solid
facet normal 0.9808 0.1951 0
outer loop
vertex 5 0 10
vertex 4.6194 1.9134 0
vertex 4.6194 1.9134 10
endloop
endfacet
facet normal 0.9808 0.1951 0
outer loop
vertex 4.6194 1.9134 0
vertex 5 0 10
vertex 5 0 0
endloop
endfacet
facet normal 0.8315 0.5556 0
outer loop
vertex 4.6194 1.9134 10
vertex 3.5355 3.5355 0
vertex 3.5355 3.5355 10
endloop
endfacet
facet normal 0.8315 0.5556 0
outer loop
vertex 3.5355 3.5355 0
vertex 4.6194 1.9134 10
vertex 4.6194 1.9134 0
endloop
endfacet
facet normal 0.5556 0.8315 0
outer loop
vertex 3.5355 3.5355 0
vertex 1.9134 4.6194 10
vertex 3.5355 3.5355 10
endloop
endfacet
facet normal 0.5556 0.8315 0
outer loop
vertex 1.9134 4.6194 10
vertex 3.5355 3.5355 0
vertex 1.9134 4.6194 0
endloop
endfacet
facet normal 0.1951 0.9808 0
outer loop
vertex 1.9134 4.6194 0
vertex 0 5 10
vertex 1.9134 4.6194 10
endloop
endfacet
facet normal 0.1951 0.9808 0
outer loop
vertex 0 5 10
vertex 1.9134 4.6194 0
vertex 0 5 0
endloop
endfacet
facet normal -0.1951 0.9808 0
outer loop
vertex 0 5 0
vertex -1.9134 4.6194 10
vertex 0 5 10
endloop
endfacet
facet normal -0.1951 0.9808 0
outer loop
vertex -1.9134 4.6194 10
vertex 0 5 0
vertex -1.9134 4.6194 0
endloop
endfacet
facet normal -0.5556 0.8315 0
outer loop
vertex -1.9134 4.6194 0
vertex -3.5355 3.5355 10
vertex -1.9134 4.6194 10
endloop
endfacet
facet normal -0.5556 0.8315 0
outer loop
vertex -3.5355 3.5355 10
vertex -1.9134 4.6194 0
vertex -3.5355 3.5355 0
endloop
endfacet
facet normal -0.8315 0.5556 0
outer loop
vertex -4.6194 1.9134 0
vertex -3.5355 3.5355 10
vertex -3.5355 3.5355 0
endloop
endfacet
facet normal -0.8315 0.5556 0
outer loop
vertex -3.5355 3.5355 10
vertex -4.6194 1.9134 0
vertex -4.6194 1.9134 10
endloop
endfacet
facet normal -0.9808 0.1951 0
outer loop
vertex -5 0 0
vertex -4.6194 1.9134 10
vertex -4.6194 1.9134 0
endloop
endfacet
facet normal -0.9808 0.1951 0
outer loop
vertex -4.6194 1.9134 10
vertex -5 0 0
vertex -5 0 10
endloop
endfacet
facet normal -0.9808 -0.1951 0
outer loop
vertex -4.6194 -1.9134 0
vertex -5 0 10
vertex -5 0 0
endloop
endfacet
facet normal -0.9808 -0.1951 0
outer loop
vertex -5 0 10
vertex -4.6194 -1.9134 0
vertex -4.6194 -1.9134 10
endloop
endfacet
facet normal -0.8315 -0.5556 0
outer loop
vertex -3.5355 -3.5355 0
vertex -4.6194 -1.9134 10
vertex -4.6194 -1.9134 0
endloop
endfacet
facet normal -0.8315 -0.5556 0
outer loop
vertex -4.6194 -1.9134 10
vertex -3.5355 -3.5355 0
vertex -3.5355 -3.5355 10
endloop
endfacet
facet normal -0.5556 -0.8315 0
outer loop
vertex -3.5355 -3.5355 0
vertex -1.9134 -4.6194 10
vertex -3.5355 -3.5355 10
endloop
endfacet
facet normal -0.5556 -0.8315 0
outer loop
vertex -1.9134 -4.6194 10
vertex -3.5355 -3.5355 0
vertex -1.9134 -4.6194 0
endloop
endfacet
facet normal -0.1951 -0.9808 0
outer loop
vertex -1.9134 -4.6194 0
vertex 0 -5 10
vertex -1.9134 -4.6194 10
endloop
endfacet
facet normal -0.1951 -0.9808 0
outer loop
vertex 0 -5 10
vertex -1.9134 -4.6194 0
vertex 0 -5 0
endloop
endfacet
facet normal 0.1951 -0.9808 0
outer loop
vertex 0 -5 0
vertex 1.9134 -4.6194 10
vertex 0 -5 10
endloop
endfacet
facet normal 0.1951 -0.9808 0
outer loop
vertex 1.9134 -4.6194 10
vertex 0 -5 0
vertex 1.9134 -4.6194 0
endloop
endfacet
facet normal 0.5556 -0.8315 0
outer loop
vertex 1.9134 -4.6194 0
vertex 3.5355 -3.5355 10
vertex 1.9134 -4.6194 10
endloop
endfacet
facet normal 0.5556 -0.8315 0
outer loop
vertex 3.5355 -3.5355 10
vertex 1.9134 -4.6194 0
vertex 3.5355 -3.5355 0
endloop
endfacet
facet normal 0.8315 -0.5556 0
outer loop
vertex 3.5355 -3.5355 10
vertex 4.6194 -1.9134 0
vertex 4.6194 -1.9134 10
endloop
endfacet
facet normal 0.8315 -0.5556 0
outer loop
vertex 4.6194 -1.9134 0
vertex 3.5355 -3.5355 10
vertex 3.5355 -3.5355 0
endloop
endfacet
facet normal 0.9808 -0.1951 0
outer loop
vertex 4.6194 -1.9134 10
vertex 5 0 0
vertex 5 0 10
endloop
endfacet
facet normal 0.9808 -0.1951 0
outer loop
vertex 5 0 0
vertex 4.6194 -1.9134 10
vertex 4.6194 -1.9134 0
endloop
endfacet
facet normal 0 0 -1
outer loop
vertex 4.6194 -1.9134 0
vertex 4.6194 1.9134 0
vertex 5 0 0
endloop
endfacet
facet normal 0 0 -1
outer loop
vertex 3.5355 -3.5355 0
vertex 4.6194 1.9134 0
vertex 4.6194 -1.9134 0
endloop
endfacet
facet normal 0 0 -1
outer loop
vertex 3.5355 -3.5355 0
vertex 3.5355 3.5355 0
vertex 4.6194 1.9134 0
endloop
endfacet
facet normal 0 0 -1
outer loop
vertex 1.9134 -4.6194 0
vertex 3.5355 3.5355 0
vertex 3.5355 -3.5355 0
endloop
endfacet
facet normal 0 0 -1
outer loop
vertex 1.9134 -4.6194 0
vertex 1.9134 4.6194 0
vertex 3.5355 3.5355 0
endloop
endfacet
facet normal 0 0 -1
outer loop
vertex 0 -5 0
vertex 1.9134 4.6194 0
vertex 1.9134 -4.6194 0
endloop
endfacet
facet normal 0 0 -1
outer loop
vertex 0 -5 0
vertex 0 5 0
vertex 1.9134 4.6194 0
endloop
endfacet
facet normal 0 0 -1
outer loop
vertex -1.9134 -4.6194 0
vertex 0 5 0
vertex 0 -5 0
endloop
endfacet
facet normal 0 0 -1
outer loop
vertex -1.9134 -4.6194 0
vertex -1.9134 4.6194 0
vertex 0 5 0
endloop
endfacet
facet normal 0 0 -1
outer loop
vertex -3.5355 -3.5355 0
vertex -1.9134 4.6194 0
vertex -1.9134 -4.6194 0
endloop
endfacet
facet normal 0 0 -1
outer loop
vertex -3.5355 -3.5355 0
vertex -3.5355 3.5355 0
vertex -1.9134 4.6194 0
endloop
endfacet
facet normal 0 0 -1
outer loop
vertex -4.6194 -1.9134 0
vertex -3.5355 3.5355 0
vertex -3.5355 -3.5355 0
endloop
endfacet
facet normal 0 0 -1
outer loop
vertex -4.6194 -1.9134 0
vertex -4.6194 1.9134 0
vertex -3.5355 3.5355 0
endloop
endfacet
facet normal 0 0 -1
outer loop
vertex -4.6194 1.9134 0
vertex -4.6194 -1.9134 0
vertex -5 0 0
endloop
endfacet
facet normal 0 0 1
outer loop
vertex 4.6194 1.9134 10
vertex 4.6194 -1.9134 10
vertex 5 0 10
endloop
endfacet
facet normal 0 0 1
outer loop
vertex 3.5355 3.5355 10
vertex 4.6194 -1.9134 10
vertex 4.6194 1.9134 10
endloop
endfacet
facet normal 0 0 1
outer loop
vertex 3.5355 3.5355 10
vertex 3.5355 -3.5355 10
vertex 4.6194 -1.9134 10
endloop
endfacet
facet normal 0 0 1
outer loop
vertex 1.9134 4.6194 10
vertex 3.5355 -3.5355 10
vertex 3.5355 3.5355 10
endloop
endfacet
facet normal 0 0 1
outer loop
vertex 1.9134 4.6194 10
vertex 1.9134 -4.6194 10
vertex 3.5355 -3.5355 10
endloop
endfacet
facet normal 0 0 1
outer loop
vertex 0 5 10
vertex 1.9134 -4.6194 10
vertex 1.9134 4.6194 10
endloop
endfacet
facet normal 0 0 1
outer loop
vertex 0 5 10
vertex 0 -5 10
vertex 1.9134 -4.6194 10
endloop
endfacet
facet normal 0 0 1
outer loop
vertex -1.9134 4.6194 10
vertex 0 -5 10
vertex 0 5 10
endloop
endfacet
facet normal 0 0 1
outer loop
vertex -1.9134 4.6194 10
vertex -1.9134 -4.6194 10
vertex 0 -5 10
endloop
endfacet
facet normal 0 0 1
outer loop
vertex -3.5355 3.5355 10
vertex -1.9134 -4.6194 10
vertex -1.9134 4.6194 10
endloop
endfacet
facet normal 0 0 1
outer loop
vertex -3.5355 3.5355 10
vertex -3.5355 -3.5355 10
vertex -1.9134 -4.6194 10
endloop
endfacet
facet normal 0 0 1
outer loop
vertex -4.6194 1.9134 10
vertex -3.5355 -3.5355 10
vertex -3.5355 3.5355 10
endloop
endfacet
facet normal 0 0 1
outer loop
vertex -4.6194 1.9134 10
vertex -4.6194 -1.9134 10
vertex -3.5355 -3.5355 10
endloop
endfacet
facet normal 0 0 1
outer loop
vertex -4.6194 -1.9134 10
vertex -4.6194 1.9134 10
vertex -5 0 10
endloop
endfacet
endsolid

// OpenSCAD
// Generated by CadMonkey
// Prompt: hey cadmonkey, create me a cylinder
// Generated at: 2025-11-10 16:47:31

cylinder(h = 10, r = 5);
